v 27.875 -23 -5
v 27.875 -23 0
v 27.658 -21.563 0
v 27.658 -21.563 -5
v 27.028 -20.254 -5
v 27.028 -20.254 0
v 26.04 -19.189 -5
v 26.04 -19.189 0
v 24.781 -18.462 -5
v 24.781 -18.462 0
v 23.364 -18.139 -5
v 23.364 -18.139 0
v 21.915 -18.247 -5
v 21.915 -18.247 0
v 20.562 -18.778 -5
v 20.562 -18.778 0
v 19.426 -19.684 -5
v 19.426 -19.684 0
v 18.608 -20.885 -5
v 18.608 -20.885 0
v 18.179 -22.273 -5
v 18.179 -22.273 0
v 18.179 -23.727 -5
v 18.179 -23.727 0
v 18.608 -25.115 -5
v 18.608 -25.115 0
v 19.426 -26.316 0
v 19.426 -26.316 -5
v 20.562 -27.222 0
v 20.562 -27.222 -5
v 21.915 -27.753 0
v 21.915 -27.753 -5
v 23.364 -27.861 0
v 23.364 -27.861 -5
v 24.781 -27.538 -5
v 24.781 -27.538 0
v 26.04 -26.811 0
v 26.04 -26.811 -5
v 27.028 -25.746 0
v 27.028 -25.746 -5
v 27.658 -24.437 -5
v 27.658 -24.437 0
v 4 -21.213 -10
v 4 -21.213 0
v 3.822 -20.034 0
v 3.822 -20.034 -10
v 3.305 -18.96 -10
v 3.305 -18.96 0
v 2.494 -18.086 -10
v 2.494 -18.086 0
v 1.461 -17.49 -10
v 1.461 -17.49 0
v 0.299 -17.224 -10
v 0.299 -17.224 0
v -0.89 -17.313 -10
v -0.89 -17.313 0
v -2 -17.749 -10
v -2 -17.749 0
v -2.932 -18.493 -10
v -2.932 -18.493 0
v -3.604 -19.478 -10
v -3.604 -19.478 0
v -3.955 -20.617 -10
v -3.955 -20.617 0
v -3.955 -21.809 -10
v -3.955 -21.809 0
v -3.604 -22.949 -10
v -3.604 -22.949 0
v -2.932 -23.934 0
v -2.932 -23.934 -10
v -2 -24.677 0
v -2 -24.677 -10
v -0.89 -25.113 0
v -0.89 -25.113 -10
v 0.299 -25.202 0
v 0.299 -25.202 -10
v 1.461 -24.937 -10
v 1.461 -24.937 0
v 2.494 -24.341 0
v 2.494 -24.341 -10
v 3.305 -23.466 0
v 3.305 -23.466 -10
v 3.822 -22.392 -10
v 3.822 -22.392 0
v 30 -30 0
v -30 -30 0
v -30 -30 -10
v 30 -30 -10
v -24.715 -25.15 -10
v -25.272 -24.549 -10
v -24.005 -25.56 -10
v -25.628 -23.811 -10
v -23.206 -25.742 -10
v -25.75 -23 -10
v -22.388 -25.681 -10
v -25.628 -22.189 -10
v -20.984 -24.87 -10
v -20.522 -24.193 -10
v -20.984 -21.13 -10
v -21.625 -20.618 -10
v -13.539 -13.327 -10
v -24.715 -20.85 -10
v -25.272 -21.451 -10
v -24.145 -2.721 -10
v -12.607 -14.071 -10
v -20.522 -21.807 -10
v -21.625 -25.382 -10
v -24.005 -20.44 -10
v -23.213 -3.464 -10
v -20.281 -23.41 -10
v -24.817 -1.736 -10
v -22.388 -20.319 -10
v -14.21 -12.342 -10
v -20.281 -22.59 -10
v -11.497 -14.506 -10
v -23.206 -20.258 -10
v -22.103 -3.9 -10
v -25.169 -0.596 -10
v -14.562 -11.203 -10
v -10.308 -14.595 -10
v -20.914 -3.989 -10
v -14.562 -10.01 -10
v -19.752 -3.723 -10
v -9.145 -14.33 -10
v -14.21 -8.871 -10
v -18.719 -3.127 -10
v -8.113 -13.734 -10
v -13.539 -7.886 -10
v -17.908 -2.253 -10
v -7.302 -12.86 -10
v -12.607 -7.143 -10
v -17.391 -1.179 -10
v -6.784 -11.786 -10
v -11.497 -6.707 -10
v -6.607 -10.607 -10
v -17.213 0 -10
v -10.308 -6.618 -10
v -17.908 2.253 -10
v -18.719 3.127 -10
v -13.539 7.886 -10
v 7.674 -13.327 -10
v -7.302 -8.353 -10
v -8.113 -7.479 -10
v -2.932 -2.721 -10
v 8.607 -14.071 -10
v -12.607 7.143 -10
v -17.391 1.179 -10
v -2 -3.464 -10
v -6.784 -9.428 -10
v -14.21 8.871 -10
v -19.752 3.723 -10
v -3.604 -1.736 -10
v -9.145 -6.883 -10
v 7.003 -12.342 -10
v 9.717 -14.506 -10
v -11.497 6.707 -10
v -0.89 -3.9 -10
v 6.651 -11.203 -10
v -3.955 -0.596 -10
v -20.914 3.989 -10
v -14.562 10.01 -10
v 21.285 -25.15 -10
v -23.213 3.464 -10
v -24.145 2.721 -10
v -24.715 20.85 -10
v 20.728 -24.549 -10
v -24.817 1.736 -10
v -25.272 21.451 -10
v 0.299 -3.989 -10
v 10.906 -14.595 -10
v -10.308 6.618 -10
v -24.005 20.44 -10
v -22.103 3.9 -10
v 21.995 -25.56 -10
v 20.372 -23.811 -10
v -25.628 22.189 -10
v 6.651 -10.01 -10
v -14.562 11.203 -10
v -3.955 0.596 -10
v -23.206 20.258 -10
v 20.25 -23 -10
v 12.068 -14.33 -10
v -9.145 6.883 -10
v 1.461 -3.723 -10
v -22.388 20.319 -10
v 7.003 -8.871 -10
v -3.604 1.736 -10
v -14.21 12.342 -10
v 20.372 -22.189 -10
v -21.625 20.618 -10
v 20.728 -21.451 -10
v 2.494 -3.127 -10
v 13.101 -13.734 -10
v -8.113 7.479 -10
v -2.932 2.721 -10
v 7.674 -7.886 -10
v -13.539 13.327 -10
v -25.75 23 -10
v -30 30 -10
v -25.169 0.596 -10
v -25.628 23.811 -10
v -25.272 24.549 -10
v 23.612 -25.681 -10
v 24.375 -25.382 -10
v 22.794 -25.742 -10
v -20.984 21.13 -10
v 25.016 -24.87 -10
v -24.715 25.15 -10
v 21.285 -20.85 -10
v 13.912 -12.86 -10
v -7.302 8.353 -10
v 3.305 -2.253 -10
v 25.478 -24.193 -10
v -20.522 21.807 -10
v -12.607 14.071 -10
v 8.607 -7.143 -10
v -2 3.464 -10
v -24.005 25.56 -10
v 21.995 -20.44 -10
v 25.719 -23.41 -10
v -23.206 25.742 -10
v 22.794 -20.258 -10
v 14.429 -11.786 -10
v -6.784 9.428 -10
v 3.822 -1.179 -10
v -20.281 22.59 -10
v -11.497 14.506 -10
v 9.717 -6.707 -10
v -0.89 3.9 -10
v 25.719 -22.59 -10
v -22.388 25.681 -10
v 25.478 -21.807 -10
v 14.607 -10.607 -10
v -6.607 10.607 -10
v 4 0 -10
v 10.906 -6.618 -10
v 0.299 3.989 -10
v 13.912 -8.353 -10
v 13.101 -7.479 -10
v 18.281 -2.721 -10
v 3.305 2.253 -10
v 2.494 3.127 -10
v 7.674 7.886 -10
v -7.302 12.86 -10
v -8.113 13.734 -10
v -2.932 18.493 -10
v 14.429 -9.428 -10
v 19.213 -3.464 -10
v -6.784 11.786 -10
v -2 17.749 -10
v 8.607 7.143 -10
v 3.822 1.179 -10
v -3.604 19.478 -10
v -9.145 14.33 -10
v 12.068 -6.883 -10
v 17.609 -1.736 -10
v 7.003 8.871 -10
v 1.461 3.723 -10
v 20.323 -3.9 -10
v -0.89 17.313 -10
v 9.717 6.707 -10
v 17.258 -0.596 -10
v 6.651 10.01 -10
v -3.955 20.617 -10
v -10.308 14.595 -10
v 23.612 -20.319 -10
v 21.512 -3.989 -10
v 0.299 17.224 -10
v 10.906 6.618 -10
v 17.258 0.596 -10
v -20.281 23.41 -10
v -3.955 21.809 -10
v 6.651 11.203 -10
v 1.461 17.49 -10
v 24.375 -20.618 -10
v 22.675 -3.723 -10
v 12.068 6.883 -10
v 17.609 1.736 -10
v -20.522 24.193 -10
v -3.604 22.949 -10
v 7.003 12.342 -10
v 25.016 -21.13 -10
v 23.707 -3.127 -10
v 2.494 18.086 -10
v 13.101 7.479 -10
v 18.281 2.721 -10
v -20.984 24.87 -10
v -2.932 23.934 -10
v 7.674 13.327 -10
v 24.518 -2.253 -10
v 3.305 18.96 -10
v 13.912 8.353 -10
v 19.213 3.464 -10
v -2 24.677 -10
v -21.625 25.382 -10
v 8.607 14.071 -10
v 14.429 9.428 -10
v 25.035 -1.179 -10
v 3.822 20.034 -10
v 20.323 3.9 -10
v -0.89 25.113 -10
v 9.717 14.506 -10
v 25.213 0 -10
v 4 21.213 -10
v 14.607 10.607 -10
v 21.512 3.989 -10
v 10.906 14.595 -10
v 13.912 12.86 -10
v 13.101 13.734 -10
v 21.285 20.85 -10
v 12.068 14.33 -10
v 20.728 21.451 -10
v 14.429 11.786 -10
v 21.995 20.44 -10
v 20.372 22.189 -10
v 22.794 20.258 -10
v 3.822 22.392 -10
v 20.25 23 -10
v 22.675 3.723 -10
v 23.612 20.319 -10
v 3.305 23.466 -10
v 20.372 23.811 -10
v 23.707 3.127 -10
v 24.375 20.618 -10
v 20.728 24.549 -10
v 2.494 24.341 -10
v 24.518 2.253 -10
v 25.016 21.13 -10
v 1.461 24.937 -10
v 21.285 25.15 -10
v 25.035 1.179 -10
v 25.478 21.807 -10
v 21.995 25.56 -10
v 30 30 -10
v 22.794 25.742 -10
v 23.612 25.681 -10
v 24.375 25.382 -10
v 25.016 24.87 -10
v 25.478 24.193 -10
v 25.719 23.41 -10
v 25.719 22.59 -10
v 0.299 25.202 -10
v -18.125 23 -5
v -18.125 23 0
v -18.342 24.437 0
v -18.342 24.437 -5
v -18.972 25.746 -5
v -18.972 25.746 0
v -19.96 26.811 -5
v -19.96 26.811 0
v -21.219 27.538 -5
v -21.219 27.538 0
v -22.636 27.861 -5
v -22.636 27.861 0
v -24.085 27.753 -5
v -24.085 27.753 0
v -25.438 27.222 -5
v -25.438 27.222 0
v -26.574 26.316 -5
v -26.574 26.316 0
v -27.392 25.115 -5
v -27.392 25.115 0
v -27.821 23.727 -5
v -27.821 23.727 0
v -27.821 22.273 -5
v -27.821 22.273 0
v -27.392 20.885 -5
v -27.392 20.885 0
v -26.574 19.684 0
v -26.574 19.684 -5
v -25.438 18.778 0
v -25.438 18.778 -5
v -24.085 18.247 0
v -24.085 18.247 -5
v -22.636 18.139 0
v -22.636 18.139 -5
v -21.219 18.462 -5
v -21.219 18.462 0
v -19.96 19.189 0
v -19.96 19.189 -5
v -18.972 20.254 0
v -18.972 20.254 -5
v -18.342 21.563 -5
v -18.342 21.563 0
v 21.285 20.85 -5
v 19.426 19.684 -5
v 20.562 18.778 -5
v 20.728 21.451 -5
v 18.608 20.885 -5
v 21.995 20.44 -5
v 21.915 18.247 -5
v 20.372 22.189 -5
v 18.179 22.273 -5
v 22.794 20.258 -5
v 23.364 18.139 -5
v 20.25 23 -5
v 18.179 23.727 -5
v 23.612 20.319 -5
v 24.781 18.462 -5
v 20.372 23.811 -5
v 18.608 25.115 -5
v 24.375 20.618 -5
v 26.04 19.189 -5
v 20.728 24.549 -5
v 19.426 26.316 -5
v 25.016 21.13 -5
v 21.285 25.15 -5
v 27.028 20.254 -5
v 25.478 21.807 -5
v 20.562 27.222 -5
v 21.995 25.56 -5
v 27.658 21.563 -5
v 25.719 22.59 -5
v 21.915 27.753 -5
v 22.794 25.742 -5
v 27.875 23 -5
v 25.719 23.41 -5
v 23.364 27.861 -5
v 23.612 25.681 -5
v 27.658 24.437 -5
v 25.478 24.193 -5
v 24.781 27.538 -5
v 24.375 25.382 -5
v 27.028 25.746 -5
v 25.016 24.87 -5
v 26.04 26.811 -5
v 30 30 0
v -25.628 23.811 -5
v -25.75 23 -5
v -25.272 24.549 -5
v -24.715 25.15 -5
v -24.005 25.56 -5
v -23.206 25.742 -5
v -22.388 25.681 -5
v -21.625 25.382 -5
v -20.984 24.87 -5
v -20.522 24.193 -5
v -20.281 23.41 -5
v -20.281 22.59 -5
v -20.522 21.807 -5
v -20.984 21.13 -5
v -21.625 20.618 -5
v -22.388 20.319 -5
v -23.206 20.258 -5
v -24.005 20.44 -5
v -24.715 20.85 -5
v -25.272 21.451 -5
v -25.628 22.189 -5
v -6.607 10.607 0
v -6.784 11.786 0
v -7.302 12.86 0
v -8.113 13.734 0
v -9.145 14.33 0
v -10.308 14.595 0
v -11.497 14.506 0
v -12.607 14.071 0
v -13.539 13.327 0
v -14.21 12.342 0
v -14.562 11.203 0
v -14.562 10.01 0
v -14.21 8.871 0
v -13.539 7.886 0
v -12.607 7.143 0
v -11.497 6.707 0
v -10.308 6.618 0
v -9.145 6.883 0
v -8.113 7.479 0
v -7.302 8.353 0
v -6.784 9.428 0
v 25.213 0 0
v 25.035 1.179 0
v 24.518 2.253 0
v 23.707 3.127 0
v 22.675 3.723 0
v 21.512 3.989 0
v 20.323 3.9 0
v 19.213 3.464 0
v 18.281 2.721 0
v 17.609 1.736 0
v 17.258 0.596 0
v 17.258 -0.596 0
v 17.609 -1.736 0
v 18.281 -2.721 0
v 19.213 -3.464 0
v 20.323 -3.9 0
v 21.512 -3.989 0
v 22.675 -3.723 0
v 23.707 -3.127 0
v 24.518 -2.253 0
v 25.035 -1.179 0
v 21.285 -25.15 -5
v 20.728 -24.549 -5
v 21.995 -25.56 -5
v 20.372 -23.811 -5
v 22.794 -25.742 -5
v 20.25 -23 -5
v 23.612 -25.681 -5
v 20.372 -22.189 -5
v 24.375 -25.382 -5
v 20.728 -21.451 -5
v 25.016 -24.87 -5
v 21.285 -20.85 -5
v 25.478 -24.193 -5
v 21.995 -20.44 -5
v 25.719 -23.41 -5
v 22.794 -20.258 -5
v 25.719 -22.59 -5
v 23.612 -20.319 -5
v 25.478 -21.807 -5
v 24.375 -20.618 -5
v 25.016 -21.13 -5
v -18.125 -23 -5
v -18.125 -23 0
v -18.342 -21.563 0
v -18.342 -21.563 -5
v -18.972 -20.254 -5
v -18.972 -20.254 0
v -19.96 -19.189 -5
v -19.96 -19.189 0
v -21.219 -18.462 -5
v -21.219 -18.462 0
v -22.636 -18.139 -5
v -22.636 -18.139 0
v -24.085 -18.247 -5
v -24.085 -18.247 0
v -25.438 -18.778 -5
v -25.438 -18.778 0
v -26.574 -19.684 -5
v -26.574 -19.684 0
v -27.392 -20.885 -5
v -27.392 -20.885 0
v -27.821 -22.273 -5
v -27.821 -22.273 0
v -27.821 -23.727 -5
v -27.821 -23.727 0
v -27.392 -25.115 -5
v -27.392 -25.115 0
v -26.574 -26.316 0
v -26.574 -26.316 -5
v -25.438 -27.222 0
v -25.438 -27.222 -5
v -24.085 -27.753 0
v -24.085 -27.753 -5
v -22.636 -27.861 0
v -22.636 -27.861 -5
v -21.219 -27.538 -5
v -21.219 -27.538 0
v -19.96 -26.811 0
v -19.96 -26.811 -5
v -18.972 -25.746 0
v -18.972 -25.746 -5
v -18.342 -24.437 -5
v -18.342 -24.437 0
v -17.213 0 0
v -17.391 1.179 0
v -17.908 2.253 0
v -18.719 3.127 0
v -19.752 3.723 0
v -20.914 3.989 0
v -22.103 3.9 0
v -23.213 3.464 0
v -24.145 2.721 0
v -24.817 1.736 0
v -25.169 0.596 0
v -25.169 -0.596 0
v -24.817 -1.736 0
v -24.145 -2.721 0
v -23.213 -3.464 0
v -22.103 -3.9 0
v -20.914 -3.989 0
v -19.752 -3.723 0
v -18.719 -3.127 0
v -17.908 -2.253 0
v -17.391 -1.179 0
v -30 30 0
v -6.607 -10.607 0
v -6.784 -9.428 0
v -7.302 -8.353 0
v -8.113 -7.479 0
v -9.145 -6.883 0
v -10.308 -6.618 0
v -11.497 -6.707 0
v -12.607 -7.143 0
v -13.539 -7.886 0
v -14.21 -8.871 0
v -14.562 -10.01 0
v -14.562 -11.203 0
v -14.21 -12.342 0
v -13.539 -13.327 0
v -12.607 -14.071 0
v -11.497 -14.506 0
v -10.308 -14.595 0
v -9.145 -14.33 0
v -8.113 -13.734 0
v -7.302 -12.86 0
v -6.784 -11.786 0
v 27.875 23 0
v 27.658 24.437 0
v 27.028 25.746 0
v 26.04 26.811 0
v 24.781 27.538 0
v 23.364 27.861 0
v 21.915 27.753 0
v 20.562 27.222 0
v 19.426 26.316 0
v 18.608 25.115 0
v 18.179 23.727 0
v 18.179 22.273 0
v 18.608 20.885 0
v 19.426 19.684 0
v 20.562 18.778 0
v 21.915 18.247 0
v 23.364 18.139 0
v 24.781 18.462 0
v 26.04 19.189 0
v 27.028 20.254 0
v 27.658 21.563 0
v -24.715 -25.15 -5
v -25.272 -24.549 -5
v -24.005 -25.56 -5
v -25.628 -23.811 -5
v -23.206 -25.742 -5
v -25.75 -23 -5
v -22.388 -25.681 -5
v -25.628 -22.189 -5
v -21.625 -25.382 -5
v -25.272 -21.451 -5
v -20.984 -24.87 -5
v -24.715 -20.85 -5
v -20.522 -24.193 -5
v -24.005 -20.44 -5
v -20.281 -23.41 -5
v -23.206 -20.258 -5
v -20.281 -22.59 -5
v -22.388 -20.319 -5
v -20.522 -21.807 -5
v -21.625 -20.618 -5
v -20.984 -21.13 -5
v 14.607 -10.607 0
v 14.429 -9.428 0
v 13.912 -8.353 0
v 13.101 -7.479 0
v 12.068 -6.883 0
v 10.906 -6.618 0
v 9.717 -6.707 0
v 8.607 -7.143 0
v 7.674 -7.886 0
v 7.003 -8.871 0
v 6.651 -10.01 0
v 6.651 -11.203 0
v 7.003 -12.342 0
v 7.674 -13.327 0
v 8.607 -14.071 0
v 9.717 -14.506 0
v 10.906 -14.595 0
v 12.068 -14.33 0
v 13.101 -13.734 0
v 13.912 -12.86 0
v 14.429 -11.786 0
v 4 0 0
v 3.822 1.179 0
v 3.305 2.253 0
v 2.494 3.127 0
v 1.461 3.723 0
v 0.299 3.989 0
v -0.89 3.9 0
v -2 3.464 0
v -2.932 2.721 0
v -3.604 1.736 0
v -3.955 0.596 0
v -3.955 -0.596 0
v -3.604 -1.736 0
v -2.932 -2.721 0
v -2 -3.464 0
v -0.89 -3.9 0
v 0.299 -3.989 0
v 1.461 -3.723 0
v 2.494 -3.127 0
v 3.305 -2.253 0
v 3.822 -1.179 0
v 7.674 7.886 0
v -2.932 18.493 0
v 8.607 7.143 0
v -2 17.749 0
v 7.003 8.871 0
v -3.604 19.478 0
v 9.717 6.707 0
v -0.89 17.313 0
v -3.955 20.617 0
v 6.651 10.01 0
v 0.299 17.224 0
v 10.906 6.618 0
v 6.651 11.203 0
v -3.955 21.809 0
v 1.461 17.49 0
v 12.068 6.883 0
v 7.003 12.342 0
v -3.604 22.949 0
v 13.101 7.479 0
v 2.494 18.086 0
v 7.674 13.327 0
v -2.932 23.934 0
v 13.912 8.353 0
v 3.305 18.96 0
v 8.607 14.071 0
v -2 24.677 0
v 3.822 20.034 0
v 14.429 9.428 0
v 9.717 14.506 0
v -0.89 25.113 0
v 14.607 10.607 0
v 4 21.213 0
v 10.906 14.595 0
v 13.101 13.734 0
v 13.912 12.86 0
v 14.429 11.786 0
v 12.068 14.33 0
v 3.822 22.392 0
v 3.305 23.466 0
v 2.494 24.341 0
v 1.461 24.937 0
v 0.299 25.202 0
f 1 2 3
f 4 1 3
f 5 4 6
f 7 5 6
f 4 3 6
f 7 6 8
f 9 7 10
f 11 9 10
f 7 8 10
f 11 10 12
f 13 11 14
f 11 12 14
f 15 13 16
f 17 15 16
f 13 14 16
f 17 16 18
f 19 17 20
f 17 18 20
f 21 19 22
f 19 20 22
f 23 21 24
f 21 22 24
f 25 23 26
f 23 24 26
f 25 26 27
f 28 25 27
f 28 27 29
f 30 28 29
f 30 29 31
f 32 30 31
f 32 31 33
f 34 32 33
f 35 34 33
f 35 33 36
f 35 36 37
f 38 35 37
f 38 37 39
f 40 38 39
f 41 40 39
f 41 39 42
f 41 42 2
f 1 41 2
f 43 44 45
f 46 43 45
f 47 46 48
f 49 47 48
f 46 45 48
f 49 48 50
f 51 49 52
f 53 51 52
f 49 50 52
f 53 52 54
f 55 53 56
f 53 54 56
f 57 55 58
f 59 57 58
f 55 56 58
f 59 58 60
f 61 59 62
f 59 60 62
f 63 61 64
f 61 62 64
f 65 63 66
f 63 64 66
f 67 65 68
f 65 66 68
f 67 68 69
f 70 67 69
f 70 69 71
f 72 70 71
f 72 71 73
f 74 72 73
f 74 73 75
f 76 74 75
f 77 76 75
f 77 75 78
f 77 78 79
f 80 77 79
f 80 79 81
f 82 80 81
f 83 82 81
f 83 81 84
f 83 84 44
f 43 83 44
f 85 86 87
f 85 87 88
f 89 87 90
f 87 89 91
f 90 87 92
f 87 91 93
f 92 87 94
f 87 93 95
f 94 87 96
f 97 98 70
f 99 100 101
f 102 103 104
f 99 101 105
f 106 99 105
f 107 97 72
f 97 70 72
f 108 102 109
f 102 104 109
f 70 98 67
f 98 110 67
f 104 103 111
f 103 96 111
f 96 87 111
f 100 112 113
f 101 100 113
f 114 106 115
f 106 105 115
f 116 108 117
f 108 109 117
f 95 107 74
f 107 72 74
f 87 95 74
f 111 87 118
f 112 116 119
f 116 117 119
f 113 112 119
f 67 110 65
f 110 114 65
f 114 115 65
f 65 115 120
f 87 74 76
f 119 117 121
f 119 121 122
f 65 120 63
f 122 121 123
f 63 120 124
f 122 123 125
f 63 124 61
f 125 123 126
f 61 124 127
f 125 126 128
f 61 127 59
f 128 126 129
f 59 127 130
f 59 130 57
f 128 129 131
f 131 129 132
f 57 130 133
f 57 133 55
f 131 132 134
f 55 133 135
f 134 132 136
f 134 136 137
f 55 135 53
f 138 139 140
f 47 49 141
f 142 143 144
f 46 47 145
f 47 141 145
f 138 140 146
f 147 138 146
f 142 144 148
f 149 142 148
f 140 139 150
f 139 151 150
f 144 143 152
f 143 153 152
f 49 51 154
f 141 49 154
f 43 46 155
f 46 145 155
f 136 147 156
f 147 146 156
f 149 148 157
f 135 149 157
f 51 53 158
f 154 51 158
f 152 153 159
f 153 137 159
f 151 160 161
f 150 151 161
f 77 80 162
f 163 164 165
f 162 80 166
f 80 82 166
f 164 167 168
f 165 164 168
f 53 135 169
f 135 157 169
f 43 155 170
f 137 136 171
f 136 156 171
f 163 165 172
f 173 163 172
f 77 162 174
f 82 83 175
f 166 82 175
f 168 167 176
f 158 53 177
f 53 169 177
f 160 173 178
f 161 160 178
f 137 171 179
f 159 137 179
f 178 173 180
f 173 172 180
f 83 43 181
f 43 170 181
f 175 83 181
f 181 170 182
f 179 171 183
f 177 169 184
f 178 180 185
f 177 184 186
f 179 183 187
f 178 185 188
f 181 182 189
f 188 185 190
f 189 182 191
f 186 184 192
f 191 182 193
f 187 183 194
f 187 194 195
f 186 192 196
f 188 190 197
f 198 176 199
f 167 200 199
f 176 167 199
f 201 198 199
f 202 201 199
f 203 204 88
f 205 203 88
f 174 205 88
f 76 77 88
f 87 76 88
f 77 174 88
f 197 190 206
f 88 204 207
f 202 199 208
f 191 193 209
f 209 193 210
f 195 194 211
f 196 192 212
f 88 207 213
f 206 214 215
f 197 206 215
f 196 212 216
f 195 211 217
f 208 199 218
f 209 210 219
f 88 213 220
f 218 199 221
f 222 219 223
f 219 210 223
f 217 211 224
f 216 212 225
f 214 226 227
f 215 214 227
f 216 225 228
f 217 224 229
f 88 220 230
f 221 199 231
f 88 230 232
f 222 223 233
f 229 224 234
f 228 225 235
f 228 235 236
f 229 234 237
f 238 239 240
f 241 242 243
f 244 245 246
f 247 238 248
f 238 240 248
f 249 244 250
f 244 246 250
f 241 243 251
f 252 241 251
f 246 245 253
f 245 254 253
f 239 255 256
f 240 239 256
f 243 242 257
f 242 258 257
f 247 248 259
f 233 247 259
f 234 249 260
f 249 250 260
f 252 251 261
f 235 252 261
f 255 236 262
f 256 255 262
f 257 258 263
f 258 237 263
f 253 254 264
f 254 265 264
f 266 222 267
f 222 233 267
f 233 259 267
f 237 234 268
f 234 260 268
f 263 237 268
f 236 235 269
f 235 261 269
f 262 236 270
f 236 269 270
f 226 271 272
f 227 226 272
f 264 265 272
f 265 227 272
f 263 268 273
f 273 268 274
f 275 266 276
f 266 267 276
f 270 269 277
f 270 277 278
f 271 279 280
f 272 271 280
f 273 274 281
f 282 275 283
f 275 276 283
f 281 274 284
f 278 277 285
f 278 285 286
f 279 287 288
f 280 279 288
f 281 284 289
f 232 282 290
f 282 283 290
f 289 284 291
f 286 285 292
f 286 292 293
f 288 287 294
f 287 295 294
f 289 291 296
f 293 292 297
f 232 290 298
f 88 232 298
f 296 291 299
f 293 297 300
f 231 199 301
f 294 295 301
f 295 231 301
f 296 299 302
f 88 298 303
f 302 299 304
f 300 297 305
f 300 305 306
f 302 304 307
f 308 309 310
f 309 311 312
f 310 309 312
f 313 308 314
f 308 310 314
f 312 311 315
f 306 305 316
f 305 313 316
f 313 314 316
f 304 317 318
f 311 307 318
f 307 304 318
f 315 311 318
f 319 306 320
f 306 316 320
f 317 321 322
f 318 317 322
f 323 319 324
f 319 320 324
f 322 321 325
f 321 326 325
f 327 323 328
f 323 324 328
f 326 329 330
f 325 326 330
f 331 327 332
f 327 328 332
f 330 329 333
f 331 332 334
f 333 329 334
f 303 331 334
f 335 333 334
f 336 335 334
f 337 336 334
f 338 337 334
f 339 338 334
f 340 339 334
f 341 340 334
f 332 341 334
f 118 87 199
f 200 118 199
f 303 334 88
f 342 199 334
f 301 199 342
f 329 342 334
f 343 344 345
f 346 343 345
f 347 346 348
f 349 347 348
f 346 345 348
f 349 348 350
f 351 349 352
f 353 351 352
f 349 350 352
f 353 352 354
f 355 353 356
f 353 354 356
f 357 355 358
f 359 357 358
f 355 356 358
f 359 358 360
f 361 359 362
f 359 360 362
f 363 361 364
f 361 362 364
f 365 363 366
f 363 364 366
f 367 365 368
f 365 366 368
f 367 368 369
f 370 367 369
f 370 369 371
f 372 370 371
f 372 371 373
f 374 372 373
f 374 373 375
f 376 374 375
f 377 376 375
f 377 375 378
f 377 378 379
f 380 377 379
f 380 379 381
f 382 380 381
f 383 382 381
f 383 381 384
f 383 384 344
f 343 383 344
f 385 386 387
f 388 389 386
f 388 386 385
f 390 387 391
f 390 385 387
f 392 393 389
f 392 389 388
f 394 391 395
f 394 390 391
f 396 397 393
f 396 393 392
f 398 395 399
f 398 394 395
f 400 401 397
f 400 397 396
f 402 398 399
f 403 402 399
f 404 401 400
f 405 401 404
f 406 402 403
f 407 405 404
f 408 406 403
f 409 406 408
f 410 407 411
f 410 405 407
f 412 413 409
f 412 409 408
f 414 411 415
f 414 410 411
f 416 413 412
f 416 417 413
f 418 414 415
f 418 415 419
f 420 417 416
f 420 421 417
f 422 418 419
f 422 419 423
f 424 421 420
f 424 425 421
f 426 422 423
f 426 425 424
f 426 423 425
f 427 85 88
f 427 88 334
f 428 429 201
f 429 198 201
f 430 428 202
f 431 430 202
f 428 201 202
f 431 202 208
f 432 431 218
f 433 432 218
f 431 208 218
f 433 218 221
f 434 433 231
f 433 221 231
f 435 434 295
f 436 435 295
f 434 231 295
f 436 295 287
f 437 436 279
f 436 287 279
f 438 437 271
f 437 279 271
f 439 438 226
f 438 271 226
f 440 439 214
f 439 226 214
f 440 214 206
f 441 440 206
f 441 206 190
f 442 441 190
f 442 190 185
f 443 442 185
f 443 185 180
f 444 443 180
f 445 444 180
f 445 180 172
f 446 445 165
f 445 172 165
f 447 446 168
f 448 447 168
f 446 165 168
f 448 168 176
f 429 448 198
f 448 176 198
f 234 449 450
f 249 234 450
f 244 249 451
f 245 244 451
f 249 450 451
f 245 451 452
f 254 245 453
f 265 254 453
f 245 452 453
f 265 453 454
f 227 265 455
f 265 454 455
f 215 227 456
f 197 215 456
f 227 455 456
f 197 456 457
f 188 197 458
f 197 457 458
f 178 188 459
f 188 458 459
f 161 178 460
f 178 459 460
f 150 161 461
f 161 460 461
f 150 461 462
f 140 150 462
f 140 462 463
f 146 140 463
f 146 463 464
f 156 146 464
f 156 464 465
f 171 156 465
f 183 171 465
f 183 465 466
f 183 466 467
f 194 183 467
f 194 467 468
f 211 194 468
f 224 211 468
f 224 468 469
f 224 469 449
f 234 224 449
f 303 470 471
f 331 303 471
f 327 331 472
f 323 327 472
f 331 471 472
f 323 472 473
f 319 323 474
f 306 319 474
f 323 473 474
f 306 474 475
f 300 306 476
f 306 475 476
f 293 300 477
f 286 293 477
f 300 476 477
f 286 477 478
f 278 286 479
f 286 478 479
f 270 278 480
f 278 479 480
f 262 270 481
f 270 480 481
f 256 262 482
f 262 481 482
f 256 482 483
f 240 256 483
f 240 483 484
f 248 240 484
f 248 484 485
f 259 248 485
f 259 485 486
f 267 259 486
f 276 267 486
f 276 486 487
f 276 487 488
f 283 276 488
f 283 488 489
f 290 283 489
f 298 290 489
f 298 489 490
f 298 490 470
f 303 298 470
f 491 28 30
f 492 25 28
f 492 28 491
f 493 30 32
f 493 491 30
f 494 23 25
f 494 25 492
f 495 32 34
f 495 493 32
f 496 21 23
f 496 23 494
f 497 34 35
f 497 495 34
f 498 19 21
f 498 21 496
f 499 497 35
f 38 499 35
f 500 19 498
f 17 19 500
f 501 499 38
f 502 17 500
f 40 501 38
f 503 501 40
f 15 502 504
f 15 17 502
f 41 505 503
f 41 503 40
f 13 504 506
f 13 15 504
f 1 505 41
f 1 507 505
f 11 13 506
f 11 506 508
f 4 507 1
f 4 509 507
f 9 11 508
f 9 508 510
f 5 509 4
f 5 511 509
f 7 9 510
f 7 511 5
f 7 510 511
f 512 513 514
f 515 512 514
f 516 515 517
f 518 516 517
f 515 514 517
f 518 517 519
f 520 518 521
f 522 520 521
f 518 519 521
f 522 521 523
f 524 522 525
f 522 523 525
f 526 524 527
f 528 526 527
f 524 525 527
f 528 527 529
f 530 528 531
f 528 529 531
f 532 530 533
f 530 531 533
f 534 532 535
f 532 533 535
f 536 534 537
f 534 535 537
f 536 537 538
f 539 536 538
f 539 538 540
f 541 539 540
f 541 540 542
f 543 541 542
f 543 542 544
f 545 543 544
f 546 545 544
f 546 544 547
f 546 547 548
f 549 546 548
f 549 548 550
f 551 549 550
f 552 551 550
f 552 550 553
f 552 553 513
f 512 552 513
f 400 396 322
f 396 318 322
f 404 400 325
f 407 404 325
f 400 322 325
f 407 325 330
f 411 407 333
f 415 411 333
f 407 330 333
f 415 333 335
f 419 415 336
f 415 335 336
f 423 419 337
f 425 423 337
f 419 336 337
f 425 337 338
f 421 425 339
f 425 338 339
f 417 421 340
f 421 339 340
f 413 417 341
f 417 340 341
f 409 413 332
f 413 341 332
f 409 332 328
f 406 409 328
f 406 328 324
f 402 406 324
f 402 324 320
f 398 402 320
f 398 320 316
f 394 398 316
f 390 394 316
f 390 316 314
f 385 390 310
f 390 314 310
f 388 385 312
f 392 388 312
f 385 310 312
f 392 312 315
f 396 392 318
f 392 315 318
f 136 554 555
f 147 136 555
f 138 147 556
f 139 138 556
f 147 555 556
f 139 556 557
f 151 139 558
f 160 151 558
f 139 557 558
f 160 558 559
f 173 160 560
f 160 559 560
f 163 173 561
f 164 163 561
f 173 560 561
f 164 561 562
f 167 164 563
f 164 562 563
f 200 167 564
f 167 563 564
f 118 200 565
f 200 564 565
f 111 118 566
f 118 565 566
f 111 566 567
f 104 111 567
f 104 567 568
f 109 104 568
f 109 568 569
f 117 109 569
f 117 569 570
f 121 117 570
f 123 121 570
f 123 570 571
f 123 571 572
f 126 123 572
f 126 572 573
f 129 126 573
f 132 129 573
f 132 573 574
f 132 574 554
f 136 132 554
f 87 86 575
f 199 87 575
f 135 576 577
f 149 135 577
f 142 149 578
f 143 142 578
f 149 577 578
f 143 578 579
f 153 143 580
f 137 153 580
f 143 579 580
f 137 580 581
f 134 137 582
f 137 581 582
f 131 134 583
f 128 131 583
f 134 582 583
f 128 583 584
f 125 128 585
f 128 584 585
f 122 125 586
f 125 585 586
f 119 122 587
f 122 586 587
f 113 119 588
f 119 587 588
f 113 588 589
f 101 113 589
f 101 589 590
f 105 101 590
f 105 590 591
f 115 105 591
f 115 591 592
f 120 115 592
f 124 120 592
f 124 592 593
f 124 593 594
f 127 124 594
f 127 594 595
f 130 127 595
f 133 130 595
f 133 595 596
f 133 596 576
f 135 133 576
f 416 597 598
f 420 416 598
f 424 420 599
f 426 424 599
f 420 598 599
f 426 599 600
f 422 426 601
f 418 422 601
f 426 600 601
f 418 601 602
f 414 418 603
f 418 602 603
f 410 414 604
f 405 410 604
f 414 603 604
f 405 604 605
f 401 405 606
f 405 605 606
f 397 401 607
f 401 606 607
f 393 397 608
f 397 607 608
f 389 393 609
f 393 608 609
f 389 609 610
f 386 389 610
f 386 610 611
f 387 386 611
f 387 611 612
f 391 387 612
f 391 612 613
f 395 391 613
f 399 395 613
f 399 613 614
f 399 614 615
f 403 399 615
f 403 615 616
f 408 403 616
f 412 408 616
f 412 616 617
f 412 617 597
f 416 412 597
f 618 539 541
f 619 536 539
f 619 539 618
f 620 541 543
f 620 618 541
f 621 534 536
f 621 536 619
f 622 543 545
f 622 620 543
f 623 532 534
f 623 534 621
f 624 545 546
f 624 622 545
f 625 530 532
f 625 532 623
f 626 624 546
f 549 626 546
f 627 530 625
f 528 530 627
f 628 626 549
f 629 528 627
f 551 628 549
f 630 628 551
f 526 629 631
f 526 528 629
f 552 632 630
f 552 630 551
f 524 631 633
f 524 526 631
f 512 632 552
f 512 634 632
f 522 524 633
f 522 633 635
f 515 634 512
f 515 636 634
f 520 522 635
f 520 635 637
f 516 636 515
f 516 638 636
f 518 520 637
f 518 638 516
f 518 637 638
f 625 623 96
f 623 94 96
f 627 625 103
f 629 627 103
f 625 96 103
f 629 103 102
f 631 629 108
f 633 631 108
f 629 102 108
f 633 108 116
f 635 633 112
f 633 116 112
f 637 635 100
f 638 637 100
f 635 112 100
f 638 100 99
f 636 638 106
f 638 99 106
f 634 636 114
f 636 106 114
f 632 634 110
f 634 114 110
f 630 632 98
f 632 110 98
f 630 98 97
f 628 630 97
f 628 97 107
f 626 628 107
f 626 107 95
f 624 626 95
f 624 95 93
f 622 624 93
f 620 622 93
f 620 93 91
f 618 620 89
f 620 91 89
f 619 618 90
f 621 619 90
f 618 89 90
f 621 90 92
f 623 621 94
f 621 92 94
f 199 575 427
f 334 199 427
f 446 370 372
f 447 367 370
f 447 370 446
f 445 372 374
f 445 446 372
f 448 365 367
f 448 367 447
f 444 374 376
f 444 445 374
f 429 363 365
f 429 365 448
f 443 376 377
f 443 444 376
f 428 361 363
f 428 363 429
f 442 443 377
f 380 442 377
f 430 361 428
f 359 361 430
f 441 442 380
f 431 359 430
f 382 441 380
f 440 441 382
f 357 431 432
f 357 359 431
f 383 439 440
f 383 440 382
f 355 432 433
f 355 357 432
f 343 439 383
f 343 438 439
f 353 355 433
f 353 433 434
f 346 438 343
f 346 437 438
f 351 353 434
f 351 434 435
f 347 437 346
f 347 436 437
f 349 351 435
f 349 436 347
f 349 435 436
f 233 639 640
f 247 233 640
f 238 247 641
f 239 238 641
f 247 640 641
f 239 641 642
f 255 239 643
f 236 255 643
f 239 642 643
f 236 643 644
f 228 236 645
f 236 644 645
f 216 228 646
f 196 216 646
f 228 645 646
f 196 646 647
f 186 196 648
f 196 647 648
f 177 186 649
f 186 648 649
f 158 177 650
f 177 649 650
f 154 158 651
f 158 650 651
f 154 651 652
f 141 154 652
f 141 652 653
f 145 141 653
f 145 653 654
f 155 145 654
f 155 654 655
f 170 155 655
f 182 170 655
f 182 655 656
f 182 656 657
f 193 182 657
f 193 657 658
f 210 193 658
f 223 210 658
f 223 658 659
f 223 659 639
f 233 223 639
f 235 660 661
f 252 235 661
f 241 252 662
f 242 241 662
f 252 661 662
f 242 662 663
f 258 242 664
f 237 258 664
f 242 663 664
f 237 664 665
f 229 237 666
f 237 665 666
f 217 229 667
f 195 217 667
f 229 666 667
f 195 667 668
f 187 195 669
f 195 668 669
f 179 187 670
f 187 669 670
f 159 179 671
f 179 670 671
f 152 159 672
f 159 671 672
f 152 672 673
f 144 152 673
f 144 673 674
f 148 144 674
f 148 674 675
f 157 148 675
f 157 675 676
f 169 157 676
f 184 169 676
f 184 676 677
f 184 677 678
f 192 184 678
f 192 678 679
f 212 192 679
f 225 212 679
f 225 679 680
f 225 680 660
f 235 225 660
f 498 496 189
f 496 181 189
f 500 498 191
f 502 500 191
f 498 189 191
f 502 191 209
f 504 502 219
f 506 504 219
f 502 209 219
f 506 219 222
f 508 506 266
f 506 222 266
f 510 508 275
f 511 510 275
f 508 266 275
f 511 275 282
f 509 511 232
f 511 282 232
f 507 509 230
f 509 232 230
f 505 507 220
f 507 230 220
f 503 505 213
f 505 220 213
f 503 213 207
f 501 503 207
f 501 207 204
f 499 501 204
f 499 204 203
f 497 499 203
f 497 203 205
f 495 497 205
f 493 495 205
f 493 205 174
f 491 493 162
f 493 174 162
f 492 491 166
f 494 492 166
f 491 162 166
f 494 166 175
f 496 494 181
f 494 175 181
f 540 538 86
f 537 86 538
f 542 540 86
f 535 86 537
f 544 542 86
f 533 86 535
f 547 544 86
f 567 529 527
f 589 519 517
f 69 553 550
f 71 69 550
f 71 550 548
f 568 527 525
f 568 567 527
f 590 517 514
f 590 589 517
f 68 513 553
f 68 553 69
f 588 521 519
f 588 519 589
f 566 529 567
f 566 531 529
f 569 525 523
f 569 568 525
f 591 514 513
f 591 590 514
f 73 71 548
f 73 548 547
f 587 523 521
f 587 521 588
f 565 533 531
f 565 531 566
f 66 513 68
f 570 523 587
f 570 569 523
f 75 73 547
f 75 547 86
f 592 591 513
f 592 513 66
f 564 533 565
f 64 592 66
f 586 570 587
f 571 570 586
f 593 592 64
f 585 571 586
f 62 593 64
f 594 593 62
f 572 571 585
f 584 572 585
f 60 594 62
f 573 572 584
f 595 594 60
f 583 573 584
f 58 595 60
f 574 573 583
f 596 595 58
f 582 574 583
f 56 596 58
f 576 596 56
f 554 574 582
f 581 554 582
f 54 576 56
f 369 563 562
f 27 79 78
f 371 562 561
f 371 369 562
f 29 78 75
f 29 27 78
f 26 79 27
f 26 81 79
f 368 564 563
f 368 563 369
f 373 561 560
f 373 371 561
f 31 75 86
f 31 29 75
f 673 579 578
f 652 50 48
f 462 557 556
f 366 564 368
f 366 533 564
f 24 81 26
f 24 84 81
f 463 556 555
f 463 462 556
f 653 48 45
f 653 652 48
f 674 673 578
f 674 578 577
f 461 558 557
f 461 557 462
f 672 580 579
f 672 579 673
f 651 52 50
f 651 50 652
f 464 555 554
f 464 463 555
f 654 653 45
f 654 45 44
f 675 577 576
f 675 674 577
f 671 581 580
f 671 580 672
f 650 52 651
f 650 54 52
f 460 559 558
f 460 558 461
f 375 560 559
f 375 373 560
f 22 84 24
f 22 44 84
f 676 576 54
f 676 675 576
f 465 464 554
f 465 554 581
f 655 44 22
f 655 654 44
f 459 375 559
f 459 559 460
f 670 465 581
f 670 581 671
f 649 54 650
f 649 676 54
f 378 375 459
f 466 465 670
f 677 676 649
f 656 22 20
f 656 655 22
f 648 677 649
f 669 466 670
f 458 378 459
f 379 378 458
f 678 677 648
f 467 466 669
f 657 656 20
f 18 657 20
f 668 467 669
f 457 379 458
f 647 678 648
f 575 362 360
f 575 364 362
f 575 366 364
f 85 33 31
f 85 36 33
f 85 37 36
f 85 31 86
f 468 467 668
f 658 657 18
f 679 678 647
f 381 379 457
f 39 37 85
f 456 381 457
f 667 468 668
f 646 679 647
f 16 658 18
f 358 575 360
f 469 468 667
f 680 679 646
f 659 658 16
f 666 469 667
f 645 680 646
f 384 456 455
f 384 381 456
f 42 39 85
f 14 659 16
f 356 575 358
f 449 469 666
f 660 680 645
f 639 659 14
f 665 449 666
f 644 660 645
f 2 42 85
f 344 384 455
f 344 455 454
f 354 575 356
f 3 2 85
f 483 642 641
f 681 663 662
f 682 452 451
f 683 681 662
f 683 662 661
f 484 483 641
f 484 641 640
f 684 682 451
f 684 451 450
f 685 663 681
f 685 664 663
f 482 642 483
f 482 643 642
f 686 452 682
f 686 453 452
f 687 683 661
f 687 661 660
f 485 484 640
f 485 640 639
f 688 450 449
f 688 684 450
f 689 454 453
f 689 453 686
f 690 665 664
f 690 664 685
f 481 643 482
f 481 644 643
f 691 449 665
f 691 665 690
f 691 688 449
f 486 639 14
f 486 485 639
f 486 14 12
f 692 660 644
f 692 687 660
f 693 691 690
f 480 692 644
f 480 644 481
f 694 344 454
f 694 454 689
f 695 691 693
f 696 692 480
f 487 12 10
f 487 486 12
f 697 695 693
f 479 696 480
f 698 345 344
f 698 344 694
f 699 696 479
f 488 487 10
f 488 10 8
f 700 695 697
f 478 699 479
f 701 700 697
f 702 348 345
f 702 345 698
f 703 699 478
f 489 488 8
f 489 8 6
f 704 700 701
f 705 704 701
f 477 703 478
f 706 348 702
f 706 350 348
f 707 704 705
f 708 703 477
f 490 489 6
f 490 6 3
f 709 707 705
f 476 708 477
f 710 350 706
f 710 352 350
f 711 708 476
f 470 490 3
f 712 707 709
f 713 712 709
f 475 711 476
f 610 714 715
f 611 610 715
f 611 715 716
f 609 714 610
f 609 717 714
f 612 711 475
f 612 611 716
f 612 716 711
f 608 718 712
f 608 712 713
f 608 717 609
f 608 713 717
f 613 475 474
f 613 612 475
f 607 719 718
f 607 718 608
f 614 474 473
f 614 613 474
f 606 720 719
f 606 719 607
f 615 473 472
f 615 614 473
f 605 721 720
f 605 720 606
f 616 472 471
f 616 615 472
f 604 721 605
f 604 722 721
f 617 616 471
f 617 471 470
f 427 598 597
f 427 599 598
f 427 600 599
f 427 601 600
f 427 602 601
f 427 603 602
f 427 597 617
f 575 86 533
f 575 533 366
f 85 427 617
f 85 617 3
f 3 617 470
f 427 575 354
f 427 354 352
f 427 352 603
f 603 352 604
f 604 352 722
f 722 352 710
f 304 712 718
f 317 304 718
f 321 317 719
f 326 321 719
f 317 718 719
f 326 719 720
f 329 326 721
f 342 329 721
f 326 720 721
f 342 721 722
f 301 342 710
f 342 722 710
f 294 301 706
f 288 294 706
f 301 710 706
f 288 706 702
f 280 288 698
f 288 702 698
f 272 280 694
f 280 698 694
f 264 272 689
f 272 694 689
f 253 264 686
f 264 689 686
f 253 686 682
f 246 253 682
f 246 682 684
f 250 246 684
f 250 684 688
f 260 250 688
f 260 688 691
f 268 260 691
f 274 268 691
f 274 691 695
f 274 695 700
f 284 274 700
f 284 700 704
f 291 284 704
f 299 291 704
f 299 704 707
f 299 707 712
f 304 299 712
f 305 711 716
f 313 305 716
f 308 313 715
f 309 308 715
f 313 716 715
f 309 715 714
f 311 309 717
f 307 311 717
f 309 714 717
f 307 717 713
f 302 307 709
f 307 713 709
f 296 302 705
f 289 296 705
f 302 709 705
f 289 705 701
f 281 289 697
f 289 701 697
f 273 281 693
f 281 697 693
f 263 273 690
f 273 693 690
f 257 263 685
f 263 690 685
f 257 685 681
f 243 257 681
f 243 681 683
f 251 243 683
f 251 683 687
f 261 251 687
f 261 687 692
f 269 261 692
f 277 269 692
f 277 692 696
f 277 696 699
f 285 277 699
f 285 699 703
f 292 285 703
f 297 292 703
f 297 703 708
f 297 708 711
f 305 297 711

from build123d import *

# Parameters (mm, degrees)
F0_W           = 60
F0_H           = 60
F1_DEPTH       = 10
F2_R           = 4
F3_DEPTH       = 10.001
F4_D           = 5.5
F4_CBORE_D     = 9.75
F4_CBORE_DEPTH = 5


with BuildPart() as f1:
    # F0 (on Top) → F1 (new body)
    with BuildSketch(Plane.XY):
        Rectangle(F0_W, F0_H)
    extrude(amount=-F1_DEPTH)

    # F2 (on face) → F3 (cut, through all)
    with BuildSketch(Plane.XY):
        with Locations((0, -21.2132034356)):
            Circle(F2_R)
        with Locations((-10.6066017178, -10.6066017178)):
            Circle(F2_R)
        with Locations((-21.2132034356, 0)):
            Circle(F2_R)
        Circle(F2_R)
        with Locations((10.6066017178, -10.6066017178)):
            Circle(F2_R)
        with Locations((21.2132034356, 0)):
            Circle(F2_R)
        with Locations((10.6066017178, 10.6066017178)):
            Circle(F2_R)
        with Locations((0, 21.2132034356)):
            Circle(F2_R)
        with Locations((-10.6066017178, 10.6066017178)):
            Circle(F2_R)
    extrude(amount=-F3_DEPTH, mode=Mode.SUBTRACT)

    # F4 (through all)
    with Locations(Plane.XY):
        with Locations((23, -23), (-23, -23), (-23, 23), (23, 23)):
            CounterBoreHole(F4_D / 2, F4_CBORE_D / 2, F4_CBORE_DEPTH)


solid = f1.part
